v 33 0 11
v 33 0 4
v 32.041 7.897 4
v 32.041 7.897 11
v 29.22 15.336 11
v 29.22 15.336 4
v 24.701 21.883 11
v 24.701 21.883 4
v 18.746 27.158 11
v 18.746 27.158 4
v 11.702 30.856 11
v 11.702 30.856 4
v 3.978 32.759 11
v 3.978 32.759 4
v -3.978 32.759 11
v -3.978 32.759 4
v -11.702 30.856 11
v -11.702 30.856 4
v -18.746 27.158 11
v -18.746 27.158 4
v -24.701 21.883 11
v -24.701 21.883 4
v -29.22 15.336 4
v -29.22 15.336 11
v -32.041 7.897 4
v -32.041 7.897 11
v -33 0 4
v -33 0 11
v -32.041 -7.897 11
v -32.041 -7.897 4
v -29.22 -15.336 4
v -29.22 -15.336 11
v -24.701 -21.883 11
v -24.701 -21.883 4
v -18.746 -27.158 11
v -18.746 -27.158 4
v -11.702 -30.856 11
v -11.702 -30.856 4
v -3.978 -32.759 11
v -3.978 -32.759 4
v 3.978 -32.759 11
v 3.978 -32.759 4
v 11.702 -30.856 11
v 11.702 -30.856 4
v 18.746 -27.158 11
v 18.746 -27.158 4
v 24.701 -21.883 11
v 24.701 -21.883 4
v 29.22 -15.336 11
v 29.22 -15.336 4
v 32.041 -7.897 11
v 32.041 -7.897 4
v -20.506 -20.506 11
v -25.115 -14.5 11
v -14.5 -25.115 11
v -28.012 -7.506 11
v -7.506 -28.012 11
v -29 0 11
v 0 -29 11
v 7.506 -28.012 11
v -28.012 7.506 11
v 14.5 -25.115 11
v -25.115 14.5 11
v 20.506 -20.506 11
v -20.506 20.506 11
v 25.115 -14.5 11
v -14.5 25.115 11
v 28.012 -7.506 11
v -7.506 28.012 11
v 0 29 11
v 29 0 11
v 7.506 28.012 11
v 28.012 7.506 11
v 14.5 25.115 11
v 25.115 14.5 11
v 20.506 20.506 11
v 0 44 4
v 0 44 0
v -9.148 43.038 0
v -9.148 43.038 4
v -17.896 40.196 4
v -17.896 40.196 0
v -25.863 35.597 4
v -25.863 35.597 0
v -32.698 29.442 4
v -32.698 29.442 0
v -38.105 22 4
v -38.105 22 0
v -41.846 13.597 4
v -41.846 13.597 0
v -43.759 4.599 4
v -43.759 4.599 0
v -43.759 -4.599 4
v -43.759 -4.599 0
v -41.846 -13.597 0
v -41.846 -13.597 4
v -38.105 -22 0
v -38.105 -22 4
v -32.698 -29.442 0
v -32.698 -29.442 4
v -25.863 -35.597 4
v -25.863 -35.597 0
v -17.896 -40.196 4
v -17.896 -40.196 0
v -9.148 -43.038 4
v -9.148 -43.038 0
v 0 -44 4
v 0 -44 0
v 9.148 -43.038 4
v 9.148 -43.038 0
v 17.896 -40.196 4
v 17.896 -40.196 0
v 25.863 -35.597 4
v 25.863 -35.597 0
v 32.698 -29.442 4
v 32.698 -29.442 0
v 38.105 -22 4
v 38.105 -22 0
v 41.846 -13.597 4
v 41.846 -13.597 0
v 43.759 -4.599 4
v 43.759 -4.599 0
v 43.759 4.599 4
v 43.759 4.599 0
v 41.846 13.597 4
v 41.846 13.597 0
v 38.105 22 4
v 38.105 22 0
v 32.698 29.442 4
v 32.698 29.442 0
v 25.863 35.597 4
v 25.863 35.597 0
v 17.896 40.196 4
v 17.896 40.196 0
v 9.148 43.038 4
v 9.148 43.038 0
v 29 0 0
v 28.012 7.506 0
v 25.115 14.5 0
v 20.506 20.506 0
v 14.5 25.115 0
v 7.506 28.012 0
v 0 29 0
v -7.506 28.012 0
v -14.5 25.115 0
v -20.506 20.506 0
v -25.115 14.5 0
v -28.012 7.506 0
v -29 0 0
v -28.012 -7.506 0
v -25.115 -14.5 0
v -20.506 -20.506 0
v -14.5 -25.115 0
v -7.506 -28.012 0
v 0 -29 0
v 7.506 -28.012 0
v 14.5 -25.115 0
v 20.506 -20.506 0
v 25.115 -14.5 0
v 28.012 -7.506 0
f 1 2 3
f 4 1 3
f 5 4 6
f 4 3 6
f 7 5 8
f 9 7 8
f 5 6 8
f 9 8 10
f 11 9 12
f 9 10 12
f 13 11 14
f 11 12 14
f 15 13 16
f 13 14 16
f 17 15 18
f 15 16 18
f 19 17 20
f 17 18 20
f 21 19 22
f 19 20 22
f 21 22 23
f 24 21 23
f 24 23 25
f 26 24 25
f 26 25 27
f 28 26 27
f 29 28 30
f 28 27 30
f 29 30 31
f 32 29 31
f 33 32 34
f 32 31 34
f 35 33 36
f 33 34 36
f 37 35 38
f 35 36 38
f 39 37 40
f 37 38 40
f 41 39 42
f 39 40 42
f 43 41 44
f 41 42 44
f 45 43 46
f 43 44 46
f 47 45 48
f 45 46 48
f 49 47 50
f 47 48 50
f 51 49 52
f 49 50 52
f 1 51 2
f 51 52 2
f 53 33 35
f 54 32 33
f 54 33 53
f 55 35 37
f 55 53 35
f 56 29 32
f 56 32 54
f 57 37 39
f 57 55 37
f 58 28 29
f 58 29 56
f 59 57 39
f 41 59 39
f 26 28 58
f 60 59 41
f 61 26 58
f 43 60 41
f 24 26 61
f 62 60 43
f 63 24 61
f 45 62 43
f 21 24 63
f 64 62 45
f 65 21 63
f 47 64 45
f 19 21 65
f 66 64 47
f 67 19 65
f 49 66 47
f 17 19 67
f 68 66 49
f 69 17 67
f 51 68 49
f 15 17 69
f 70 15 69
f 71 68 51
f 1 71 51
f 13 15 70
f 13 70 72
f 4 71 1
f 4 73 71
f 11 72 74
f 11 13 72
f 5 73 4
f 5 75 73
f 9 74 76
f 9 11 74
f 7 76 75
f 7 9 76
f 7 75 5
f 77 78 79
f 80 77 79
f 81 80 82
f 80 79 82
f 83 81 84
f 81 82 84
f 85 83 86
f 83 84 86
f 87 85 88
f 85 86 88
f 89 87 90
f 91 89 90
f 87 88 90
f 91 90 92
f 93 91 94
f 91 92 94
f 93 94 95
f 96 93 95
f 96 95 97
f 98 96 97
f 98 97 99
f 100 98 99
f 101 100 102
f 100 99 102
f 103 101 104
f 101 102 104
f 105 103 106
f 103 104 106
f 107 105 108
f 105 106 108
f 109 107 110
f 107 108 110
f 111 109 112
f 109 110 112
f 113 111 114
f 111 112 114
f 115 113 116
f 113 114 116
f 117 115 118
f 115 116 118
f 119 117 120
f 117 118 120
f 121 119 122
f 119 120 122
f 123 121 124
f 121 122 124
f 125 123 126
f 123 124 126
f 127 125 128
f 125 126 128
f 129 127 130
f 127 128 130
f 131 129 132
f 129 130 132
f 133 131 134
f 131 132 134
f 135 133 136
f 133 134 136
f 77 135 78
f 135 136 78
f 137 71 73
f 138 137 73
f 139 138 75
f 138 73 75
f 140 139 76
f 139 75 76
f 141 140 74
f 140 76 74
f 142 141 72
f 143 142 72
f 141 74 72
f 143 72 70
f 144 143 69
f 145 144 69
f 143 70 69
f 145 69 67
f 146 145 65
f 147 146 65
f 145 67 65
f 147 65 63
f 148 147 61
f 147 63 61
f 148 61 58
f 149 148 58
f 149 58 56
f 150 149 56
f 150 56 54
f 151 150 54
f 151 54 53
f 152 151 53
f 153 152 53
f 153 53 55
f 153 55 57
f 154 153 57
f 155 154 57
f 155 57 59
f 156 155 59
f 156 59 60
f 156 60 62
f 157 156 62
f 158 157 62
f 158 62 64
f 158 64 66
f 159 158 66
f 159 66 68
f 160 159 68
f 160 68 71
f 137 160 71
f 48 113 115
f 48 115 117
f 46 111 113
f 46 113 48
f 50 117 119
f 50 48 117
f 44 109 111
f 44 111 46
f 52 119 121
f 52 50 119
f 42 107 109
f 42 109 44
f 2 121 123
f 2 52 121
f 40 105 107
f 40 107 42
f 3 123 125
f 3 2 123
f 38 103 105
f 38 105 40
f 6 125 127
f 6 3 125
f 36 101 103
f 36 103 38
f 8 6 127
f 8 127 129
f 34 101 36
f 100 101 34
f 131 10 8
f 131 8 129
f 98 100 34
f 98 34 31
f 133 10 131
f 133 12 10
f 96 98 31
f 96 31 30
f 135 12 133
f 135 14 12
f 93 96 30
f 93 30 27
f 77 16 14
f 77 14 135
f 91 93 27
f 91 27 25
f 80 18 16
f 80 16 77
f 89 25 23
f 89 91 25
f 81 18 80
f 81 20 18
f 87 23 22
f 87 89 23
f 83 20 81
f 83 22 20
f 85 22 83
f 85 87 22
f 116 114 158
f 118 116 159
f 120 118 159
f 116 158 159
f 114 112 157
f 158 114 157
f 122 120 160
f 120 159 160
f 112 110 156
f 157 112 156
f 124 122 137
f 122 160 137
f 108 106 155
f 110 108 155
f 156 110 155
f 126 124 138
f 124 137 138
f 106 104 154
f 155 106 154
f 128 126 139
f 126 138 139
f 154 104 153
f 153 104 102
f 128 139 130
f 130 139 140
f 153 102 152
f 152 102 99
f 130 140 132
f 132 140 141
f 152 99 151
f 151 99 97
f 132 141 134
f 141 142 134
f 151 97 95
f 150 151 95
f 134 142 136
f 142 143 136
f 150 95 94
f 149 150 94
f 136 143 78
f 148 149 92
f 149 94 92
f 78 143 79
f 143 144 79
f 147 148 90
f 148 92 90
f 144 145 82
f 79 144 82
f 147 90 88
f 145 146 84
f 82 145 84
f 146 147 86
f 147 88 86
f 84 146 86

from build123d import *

# Parameters (mm, degrees)
SKETCH1_R               = 44
BOSS_EXTRUDE1_DEPTH     = 4
SKETCH2_R               = 33
BOSS_EXTRUDE2_DEPTH     = 7
SKETCH3_R               = 29
CUT_EXTRUDE1_DEPTH      = 1
CUT_EXTRUDE1_DEPTH_BACK = 12


with BuildPart() as part:
    # Sketch1 → Boss-Extrude1 (new body)
    with BuildSketch(Plane(origin=(0, 0, 0), x_dir=(0, 1, 0), z_dir=(0, 0, 1))):
        Circle(SKETCH1_R)
    extrude(amount=BOSS_EXTRUDE1_DEPTH)

    # Sketch2 → Boss-Extrude2 (add)
    with BuildSketch(Plane.XY.offset(4)):
        Circle(SKETCH2_R)
    extrude(amount=BOSS_EXTRUDE2_DEPTH)

    # Sketch3 → Cut-Extrude1 (cut, two sides)
    with BuildSketch(Plane.XY.offset(11)) as cut_extrude1_sk:
        Circle(SKETCH3_R)
    extrude(amount=CUT_EXTRUDE1_DEPTH, mode=Mode.SUBTRACT)
    extrude(cut_extrude1_sk.sketch, amount=-CUT_EXTRUDE1_DEPTH_BACK, mode=Mode.SUBTRACT)


solid = part.part
